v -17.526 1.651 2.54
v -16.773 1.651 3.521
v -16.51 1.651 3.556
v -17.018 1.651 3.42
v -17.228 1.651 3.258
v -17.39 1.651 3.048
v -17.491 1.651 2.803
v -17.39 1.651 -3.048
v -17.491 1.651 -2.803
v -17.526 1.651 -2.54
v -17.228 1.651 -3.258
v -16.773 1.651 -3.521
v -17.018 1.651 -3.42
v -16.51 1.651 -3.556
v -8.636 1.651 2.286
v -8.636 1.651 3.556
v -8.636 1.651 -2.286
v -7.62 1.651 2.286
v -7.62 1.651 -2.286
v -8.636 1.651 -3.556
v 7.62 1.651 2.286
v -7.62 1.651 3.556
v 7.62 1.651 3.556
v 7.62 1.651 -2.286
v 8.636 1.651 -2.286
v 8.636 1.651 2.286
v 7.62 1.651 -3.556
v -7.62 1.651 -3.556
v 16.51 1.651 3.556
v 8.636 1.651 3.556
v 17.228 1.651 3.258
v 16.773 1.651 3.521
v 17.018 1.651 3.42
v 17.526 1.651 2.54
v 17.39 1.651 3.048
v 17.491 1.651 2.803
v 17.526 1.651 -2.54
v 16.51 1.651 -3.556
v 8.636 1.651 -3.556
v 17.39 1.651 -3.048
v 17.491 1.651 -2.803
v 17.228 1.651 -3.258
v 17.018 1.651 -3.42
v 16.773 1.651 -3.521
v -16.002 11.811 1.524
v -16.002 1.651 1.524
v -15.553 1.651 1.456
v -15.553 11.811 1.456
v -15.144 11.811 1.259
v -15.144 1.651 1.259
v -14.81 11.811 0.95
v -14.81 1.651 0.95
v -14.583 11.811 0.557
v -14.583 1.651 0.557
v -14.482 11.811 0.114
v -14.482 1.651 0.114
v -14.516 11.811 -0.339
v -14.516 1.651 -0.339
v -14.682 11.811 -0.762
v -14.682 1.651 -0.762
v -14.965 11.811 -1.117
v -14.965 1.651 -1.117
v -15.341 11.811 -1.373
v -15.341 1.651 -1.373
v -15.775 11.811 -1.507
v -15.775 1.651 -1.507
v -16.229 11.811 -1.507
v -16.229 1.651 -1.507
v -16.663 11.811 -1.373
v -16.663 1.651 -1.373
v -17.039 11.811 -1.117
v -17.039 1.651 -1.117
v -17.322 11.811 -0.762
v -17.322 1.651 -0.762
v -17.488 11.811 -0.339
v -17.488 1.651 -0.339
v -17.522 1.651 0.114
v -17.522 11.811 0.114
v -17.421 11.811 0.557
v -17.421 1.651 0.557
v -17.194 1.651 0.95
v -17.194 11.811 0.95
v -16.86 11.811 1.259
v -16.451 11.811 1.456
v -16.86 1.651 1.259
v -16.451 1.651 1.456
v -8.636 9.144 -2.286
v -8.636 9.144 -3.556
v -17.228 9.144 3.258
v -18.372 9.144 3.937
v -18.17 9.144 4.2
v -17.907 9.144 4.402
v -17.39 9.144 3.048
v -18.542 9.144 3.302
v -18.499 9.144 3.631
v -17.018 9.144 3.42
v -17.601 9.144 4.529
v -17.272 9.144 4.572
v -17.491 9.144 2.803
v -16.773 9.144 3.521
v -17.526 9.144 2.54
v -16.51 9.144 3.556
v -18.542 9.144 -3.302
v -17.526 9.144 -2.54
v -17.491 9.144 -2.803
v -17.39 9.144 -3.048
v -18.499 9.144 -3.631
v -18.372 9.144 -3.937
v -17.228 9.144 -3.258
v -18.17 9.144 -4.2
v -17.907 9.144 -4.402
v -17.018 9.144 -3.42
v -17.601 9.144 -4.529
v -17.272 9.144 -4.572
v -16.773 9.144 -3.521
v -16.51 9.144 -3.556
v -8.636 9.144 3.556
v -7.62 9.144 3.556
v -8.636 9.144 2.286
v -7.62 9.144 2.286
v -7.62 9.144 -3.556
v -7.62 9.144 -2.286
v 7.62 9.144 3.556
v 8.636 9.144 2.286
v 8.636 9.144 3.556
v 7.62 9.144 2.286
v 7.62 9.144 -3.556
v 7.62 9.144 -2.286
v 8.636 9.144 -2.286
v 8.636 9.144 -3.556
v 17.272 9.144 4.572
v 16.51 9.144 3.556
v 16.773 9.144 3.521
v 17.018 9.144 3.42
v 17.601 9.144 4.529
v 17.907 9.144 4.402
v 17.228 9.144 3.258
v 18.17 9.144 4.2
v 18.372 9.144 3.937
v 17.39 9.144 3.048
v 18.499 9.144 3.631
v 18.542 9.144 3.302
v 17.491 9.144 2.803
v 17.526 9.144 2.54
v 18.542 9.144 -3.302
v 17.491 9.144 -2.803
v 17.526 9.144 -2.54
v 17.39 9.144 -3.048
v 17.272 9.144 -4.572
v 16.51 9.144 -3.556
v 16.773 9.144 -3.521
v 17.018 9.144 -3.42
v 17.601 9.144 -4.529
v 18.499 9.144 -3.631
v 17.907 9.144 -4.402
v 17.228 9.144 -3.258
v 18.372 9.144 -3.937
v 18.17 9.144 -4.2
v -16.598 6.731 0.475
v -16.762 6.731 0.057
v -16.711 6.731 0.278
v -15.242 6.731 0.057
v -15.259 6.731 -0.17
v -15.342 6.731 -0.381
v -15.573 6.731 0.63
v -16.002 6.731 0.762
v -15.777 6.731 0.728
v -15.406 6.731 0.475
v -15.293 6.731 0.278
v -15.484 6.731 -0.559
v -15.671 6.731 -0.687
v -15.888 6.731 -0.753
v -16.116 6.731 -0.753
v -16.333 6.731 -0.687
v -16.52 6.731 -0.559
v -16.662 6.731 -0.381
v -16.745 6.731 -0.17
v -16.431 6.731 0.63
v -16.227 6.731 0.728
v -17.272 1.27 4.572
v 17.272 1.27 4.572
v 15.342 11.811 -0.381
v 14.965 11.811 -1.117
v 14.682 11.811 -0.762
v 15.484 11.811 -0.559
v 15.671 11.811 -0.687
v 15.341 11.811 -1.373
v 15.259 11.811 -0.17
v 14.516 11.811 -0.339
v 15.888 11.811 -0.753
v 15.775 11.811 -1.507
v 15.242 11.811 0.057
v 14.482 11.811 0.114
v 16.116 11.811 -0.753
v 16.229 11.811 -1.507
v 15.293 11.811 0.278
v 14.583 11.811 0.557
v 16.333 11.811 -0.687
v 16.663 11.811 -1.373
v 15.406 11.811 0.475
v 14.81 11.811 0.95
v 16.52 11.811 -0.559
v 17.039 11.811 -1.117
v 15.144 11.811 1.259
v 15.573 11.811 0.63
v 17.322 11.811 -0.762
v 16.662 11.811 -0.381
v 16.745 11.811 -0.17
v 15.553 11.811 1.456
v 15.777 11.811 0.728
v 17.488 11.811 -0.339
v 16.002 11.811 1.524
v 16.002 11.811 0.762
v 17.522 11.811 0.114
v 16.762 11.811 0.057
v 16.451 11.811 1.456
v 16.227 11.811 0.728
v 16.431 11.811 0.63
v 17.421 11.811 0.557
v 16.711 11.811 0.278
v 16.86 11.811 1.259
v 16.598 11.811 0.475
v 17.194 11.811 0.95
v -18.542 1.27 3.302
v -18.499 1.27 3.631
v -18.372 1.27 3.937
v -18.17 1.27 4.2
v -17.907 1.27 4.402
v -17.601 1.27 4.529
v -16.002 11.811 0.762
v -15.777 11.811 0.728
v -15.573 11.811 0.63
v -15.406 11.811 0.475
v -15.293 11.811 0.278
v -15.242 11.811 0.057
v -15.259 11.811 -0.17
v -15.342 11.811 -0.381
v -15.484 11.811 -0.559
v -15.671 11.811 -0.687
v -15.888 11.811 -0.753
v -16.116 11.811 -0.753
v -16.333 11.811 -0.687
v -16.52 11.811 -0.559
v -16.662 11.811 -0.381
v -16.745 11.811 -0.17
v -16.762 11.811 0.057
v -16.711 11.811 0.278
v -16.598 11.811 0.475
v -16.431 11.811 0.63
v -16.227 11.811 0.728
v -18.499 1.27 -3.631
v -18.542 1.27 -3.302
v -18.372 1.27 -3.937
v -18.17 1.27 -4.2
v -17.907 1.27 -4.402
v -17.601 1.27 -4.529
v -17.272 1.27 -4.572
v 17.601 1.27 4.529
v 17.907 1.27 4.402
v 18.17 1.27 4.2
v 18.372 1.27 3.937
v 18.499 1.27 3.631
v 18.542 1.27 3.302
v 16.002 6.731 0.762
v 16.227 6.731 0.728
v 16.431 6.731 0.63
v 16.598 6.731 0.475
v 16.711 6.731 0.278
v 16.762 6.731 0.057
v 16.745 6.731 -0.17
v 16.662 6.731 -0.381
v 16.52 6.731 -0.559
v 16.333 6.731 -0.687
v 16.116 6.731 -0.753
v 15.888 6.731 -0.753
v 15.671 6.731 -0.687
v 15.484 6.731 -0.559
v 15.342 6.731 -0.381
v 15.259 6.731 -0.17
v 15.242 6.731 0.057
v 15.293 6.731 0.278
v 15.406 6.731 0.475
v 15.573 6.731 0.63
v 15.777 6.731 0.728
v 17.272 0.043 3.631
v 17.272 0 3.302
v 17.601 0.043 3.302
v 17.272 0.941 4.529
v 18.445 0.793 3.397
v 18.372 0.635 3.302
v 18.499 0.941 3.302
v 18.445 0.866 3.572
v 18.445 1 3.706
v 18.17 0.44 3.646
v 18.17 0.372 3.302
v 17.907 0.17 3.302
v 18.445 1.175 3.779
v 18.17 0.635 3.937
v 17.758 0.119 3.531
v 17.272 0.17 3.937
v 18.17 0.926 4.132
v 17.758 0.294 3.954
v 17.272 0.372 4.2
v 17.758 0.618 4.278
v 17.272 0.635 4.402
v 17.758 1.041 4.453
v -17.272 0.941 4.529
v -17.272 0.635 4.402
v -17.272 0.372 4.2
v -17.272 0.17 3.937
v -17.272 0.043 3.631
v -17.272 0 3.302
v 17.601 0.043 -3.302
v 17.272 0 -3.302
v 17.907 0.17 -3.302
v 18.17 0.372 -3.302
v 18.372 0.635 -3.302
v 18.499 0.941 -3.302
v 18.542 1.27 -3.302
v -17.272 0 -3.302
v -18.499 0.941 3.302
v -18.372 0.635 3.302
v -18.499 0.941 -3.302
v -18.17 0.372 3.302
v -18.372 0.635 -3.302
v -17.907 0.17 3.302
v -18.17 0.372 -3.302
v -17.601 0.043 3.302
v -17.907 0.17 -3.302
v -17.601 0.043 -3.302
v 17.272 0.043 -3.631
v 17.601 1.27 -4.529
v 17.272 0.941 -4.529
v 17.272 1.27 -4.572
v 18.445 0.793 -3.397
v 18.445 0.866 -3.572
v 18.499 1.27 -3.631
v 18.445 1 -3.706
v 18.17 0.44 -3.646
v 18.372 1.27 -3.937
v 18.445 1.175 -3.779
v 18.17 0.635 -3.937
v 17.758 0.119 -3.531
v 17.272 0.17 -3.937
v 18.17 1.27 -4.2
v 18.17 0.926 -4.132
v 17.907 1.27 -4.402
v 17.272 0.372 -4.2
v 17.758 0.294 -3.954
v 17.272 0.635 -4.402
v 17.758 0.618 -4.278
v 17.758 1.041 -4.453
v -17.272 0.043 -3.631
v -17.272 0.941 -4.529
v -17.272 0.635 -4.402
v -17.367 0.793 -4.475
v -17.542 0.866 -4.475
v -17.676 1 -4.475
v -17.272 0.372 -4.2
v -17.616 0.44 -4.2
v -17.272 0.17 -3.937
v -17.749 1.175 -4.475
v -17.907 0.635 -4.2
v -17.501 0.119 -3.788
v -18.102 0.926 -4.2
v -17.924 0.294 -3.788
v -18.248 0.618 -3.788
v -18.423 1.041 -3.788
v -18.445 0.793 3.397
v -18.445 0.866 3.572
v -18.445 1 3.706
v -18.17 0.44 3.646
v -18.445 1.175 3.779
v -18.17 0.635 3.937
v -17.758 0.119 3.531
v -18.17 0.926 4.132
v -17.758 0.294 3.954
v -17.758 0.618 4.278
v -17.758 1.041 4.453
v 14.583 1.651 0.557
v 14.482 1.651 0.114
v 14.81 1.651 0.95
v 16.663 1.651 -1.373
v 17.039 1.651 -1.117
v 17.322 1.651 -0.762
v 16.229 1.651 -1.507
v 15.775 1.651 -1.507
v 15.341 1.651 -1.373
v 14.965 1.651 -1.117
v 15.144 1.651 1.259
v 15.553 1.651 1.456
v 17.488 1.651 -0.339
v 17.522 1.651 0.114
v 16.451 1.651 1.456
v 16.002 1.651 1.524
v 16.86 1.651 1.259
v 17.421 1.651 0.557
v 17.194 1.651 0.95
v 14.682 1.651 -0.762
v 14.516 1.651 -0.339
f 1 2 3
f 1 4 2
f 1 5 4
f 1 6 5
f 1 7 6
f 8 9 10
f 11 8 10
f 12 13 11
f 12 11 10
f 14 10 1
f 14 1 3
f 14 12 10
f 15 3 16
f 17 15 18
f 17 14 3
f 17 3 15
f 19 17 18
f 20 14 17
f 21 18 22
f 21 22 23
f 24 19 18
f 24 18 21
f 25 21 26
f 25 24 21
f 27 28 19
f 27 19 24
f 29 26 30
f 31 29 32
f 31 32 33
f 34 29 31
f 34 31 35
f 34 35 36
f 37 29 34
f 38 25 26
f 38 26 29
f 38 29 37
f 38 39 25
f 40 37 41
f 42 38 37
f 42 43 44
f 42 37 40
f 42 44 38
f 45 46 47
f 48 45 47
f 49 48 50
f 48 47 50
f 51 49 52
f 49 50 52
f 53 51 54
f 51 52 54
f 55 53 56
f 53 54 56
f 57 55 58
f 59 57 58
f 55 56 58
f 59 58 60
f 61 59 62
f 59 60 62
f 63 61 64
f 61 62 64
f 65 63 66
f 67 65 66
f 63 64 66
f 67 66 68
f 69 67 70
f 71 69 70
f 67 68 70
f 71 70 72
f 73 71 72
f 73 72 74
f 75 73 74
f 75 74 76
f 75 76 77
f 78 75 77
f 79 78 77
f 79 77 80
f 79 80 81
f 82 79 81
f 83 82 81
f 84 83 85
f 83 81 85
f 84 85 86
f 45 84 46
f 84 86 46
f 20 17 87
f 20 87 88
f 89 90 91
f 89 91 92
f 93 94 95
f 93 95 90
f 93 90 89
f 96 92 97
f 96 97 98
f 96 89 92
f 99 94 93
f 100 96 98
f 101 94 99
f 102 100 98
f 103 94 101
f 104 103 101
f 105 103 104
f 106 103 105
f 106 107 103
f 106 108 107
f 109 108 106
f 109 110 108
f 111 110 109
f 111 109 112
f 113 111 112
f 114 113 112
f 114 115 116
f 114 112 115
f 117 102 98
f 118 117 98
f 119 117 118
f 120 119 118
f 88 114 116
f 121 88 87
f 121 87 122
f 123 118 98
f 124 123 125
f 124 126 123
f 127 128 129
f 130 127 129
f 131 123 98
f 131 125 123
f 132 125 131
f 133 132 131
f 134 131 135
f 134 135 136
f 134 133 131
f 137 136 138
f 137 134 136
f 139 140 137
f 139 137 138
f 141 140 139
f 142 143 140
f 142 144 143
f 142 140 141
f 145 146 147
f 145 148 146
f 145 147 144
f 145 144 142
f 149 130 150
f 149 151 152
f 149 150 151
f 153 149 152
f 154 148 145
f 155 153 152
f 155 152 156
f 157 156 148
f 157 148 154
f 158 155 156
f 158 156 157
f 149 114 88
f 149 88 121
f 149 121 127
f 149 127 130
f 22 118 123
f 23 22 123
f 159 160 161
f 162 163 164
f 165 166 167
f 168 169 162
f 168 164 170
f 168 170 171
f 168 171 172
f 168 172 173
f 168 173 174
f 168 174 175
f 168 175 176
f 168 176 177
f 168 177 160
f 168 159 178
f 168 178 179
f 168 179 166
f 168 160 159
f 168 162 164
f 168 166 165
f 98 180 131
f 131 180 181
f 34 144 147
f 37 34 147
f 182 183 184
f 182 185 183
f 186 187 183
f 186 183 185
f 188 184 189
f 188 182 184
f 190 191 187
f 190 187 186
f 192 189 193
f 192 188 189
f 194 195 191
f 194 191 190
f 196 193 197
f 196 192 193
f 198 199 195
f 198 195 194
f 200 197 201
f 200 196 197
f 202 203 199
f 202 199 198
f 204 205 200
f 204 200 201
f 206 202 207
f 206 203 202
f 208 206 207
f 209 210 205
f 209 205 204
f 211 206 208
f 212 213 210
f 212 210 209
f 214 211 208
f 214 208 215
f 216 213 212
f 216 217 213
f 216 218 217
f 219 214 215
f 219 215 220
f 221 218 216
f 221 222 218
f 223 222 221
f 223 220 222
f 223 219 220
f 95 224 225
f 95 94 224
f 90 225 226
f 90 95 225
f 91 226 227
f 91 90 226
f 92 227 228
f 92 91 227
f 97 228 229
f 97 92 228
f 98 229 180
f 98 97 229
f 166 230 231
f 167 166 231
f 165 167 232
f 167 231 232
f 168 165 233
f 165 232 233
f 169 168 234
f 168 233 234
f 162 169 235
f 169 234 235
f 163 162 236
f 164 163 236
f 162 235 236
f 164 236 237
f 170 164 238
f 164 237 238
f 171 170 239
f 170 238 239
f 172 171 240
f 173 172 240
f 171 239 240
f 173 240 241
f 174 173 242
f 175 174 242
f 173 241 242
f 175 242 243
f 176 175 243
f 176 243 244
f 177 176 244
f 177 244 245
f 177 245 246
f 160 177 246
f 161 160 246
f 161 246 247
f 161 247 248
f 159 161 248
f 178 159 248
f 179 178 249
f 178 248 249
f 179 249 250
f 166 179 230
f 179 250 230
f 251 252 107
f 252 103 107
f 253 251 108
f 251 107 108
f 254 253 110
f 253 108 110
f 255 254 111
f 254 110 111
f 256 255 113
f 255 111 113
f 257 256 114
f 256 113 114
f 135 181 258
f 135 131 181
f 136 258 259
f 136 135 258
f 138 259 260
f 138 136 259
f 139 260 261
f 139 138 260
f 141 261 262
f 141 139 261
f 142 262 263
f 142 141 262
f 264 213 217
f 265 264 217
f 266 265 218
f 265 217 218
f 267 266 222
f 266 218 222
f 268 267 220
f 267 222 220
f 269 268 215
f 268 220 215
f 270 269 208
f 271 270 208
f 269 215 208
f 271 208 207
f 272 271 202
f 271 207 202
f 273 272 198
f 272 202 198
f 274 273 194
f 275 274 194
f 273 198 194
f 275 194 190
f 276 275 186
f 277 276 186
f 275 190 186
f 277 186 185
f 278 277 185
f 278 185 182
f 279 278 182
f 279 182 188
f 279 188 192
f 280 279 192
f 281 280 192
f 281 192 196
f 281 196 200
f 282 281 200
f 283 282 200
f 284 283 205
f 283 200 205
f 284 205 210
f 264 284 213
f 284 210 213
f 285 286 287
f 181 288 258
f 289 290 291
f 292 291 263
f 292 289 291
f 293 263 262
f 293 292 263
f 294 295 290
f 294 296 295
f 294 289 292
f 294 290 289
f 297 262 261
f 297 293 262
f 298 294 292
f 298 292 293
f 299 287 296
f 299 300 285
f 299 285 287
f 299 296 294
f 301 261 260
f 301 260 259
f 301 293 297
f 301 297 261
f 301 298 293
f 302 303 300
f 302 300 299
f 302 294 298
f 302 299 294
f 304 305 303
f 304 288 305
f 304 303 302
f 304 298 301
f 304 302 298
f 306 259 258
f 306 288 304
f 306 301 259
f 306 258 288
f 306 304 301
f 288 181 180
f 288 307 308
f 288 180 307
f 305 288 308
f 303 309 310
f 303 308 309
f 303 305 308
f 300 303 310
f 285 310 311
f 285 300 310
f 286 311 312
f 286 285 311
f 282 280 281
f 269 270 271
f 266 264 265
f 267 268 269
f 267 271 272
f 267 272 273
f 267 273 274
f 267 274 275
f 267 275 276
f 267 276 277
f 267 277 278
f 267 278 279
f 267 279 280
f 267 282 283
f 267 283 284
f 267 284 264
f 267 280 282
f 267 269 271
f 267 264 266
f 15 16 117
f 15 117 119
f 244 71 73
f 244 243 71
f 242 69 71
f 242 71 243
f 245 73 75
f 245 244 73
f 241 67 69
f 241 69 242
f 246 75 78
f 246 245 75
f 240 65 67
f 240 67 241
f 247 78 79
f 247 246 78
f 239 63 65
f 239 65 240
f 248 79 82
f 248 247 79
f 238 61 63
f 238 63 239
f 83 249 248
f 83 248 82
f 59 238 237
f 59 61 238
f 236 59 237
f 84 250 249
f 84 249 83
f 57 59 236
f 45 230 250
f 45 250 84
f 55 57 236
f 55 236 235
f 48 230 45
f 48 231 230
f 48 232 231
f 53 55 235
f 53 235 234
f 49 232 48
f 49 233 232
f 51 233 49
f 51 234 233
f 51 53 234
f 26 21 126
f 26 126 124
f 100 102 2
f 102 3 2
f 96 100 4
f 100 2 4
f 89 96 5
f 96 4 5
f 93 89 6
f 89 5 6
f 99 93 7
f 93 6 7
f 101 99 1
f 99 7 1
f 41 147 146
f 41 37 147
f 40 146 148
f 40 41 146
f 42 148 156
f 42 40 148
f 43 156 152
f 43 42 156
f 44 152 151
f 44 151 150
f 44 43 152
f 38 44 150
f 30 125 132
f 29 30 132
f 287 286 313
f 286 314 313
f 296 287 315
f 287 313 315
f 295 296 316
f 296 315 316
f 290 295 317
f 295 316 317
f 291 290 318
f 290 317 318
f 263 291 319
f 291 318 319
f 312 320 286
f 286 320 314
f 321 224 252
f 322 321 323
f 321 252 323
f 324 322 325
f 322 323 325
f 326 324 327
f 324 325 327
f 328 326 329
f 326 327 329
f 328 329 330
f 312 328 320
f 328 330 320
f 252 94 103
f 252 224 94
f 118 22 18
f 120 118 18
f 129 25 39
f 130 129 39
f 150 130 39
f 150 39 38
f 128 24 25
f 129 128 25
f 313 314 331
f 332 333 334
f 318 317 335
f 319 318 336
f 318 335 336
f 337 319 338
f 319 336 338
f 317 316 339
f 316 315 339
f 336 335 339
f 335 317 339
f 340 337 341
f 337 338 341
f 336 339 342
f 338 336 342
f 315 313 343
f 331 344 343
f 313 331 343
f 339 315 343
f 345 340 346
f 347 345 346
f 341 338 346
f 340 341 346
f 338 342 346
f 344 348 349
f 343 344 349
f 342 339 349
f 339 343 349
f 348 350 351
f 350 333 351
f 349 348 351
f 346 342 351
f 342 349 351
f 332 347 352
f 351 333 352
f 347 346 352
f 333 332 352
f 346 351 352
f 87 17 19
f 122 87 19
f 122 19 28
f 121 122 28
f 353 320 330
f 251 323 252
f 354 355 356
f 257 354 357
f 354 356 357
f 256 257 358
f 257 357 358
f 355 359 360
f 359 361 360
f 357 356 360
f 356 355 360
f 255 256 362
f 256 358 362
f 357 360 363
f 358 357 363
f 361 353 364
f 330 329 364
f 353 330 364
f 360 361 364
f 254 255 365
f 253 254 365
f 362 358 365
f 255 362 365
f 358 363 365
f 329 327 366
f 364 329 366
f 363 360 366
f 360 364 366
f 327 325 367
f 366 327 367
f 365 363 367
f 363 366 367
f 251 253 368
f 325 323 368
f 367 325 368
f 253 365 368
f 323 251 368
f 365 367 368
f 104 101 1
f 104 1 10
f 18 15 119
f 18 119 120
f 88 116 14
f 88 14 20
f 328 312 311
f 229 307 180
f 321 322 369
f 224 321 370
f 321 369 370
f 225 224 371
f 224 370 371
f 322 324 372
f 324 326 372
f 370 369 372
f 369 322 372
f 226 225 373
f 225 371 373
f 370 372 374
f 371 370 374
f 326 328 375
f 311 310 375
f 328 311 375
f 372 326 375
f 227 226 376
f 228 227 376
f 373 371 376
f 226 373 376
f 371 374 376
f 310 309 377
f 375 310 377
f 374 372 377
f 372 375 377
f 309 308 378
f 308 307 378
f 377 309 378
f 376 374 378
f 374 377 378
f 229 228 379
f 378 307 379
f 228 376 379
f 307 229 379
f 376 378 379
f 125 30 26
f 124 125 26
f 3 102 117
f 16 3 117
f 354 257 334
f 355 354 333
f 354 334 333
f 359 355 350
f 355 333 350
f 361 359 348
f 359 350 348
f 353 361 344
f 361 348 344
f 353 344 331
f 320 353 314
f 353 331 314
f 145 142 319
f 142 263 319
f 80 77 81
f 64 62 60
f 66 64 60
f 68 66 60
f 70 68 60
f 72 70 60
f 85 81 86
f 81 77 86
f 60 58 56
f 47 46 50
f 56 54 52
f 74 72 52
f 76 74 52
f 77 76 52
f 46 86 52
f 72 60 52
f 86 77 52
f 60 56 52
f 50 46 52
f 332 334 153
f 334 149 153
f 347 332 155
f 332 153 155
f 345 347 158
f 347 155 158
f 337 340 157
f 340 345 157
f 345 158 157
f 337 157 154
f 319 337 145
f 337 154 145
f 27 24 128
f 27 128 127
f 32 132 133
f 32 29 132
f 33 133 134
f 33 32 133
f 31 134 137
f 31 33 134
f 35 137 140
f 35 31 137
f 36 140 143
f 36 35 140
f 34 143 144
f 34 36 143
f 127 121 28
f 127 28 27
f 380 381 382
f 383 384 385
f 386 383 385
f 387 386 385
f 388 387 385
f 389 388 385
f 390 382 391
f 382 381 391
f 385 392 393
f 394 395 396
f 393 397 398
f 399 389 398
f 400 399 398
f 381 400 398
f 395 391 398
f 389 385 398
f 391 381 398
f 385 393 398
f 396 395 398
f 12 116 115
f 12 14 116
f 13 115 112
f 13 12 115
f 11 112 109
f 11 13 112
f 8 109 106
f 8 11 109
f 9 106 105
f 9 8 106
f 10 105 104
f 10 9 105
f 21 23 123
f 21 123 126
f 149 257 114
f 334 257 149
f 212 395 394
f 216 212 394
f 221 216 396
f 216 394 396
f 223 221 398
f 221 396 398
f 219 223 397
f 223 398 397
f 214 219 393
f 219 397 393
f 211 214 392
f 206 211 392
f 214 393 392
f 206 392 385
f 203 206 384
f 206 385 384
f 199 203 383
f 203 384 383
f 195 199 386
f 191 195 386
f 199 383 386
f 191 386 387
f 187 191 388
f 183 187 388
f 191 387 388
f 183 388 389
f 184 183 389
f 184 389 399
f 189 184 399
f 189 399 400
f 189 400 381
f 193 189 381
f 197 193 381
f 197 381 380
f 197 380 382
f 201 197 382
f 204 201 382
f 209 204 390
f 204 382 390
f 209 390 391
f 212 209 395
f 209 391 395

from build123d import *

# Parameters (mm, degrees)
SKETCH1_W             = 37.084
SKETCH1_H             = 9.144
BOSS_EXTRUDE1_DEPTH   = 9.144
SKETCH2_W             = 35.052
SKETCH2_H             = 7.112
CUT_EXTRUDE3_DEPTH    = 7.493
FILLET1_R             = 1.27
FILLET2_R             = 1.016
SKETCH10_W            = 1.016
SKETCH10_H            = 1.27
BOSS_EXTRUDE5_DEPTH   = 7.493
SKETCH11_R            = 1.524
BOSS_EXTRUDE8_DEPTH   = 10.16
BOSS_EXTRUDE8_2_DEPTH = 10.16
SKETCH12_R            = 0.762
CUT_EXTRUDE4_DEPTH    = 5.08


with BuildPart() as part:
    # Sketch1 → Boss-Extrude1 (new body)
    with BuildSketch(Plane(origin=(0, 0, 0), x_dir=(1, 0, 0), z_dir=(0, 1, 0))):
        Rectangle(SKETCH1_W, SKETCH1_H)
    extrude(amount=BOSS_EXTRUDE1_DEPTH)

    # Sketch2 → Cut-Extrude3 (cut)
    with BuildSketch(Plane(origin=(0, 9.144, 0), x_dir=(1, 0, 0), z_dir=(0, 1, 0))):
        Rectangle(SKETCH2_W, SKETCH2_H)
    extrude(amount=-CUT_EXTRUDE3_DEPTH, mode=Mode.SUBTRACT)

    # Fillet1
    fillet1_edges = [part.edges().sort_by_distance(p)[0] for p in [
        (0, 0, 4.572),
        (-18.542, 0, 0),
        (0, 0, -4.572),
        (18.542, 0, 0),
        (18.542, 4.572, 4.572),
        (-18.542, 4.572, 4.572),
        (-18.542, 4.572, -4.572),
        (18.542, 4.572, -4.572),
    ]]
    fillet(fillet1_edges, radius=FILLET1_R)

    # Fillet2
    fillet2_edges = [part.edges().sort_by_distance(p)[0] for p in [
        (-17.526, 5.3975, -3.556),
        (-17.526, 5.3975, 3.556),
        (17.526, 5.3975, 3.556),
        (17.526, 5.3975, -3.556),
    ]]
    fillet(fillet2_edges, radius=FILLET2_R)

    # Sketch10 → Boss-Extrude5 (add)
    with BuildSketch(Plane(origin=(0, 1.651, 0), x_dir=(1, 0, 0), z_dir=(0, 1, 0))):
        with Locations((-8.128, 2.921)):
            Rectangle(SKETCH10_W, SKETCH10_H)
        with Locations((8.128, 2.921)):
            Rectangle(SKETCH10_W, SKETCH10_H)
        with Locations((-8.128, -2.921)):
            Rectangle(SKETCH10_W, SKETCH10_H)
        with Locations((8.128, -2.921)):
            Rectangle(SKETCH10_W, SKETCH10_H)
    extrude(amount=BOSS_EXTRUDE5_DEPTH)


with BuildPart() as body_2:
    # Sketch11 → Boss-Extrude8 (new body)
    with BuildSketch(Plane(origin=(0, 1.651, 0), x_dir=(1, 0, 0), z_dir=(0, 1, 0))):
        with Locations(Location((16.002, 0, 0), (0, 0, 270))):
            Circle(SKETCH11_R)
    extrude(amount=BOSS_EXTRUDE8_DEPTH)


with BuildPart() as body_3:
    # Sketch11 → Boss-Extrude8 2 (new body)
    with BuildSketch(Plane(origin=(0, 1.651, 0), x_dir=(1, 0, 0), z_dir=(0, 1, 0))):
        with Locations(Location((-16.002, 0, 0), (0, 0, 270))):
            Circle(SKETCH11_R)
    extrude(amount=BOSS_EXTRUDE8_2_DEPTH)


with BuildPart() as cut_extrude4_tool:
    # Sketch12 → Cut-Extrude4 (new body)
    with BuildSketch(Plane(origin=(0, 11.811, 0), x_dir=(1, 0, 0), z_dir=(0, 1, 0))):
        with Locations(Location((-16.002, 0, 0), (0, 0, 270))):
            Circle(SKETCH12_R)
        with Locations(Location((16.002, 0, 0), (0, 0, 270))):
            Circle(SKETCH12_R)
    extrude(amount=-CUT_EXTRUDE4_DEPTH)


with BuildPart() as body_2_1:
    add(body_2.part)

    # Cut-Extrude4: cut by cut_extrude4_tool
    add(cut_extrude4_tool.part, mode=Mode.SUBTRACT)


with BuildPart() as body_3_1:
    add(body_3.part)

    # Cut-Extrude4: cut by cut_extrude4_tool
    add(cut_extrude4_tool.part, mode=Mode.SUBTRACT)


solid = Compound([part.part, body_2_1.part, body_3_1.part])
